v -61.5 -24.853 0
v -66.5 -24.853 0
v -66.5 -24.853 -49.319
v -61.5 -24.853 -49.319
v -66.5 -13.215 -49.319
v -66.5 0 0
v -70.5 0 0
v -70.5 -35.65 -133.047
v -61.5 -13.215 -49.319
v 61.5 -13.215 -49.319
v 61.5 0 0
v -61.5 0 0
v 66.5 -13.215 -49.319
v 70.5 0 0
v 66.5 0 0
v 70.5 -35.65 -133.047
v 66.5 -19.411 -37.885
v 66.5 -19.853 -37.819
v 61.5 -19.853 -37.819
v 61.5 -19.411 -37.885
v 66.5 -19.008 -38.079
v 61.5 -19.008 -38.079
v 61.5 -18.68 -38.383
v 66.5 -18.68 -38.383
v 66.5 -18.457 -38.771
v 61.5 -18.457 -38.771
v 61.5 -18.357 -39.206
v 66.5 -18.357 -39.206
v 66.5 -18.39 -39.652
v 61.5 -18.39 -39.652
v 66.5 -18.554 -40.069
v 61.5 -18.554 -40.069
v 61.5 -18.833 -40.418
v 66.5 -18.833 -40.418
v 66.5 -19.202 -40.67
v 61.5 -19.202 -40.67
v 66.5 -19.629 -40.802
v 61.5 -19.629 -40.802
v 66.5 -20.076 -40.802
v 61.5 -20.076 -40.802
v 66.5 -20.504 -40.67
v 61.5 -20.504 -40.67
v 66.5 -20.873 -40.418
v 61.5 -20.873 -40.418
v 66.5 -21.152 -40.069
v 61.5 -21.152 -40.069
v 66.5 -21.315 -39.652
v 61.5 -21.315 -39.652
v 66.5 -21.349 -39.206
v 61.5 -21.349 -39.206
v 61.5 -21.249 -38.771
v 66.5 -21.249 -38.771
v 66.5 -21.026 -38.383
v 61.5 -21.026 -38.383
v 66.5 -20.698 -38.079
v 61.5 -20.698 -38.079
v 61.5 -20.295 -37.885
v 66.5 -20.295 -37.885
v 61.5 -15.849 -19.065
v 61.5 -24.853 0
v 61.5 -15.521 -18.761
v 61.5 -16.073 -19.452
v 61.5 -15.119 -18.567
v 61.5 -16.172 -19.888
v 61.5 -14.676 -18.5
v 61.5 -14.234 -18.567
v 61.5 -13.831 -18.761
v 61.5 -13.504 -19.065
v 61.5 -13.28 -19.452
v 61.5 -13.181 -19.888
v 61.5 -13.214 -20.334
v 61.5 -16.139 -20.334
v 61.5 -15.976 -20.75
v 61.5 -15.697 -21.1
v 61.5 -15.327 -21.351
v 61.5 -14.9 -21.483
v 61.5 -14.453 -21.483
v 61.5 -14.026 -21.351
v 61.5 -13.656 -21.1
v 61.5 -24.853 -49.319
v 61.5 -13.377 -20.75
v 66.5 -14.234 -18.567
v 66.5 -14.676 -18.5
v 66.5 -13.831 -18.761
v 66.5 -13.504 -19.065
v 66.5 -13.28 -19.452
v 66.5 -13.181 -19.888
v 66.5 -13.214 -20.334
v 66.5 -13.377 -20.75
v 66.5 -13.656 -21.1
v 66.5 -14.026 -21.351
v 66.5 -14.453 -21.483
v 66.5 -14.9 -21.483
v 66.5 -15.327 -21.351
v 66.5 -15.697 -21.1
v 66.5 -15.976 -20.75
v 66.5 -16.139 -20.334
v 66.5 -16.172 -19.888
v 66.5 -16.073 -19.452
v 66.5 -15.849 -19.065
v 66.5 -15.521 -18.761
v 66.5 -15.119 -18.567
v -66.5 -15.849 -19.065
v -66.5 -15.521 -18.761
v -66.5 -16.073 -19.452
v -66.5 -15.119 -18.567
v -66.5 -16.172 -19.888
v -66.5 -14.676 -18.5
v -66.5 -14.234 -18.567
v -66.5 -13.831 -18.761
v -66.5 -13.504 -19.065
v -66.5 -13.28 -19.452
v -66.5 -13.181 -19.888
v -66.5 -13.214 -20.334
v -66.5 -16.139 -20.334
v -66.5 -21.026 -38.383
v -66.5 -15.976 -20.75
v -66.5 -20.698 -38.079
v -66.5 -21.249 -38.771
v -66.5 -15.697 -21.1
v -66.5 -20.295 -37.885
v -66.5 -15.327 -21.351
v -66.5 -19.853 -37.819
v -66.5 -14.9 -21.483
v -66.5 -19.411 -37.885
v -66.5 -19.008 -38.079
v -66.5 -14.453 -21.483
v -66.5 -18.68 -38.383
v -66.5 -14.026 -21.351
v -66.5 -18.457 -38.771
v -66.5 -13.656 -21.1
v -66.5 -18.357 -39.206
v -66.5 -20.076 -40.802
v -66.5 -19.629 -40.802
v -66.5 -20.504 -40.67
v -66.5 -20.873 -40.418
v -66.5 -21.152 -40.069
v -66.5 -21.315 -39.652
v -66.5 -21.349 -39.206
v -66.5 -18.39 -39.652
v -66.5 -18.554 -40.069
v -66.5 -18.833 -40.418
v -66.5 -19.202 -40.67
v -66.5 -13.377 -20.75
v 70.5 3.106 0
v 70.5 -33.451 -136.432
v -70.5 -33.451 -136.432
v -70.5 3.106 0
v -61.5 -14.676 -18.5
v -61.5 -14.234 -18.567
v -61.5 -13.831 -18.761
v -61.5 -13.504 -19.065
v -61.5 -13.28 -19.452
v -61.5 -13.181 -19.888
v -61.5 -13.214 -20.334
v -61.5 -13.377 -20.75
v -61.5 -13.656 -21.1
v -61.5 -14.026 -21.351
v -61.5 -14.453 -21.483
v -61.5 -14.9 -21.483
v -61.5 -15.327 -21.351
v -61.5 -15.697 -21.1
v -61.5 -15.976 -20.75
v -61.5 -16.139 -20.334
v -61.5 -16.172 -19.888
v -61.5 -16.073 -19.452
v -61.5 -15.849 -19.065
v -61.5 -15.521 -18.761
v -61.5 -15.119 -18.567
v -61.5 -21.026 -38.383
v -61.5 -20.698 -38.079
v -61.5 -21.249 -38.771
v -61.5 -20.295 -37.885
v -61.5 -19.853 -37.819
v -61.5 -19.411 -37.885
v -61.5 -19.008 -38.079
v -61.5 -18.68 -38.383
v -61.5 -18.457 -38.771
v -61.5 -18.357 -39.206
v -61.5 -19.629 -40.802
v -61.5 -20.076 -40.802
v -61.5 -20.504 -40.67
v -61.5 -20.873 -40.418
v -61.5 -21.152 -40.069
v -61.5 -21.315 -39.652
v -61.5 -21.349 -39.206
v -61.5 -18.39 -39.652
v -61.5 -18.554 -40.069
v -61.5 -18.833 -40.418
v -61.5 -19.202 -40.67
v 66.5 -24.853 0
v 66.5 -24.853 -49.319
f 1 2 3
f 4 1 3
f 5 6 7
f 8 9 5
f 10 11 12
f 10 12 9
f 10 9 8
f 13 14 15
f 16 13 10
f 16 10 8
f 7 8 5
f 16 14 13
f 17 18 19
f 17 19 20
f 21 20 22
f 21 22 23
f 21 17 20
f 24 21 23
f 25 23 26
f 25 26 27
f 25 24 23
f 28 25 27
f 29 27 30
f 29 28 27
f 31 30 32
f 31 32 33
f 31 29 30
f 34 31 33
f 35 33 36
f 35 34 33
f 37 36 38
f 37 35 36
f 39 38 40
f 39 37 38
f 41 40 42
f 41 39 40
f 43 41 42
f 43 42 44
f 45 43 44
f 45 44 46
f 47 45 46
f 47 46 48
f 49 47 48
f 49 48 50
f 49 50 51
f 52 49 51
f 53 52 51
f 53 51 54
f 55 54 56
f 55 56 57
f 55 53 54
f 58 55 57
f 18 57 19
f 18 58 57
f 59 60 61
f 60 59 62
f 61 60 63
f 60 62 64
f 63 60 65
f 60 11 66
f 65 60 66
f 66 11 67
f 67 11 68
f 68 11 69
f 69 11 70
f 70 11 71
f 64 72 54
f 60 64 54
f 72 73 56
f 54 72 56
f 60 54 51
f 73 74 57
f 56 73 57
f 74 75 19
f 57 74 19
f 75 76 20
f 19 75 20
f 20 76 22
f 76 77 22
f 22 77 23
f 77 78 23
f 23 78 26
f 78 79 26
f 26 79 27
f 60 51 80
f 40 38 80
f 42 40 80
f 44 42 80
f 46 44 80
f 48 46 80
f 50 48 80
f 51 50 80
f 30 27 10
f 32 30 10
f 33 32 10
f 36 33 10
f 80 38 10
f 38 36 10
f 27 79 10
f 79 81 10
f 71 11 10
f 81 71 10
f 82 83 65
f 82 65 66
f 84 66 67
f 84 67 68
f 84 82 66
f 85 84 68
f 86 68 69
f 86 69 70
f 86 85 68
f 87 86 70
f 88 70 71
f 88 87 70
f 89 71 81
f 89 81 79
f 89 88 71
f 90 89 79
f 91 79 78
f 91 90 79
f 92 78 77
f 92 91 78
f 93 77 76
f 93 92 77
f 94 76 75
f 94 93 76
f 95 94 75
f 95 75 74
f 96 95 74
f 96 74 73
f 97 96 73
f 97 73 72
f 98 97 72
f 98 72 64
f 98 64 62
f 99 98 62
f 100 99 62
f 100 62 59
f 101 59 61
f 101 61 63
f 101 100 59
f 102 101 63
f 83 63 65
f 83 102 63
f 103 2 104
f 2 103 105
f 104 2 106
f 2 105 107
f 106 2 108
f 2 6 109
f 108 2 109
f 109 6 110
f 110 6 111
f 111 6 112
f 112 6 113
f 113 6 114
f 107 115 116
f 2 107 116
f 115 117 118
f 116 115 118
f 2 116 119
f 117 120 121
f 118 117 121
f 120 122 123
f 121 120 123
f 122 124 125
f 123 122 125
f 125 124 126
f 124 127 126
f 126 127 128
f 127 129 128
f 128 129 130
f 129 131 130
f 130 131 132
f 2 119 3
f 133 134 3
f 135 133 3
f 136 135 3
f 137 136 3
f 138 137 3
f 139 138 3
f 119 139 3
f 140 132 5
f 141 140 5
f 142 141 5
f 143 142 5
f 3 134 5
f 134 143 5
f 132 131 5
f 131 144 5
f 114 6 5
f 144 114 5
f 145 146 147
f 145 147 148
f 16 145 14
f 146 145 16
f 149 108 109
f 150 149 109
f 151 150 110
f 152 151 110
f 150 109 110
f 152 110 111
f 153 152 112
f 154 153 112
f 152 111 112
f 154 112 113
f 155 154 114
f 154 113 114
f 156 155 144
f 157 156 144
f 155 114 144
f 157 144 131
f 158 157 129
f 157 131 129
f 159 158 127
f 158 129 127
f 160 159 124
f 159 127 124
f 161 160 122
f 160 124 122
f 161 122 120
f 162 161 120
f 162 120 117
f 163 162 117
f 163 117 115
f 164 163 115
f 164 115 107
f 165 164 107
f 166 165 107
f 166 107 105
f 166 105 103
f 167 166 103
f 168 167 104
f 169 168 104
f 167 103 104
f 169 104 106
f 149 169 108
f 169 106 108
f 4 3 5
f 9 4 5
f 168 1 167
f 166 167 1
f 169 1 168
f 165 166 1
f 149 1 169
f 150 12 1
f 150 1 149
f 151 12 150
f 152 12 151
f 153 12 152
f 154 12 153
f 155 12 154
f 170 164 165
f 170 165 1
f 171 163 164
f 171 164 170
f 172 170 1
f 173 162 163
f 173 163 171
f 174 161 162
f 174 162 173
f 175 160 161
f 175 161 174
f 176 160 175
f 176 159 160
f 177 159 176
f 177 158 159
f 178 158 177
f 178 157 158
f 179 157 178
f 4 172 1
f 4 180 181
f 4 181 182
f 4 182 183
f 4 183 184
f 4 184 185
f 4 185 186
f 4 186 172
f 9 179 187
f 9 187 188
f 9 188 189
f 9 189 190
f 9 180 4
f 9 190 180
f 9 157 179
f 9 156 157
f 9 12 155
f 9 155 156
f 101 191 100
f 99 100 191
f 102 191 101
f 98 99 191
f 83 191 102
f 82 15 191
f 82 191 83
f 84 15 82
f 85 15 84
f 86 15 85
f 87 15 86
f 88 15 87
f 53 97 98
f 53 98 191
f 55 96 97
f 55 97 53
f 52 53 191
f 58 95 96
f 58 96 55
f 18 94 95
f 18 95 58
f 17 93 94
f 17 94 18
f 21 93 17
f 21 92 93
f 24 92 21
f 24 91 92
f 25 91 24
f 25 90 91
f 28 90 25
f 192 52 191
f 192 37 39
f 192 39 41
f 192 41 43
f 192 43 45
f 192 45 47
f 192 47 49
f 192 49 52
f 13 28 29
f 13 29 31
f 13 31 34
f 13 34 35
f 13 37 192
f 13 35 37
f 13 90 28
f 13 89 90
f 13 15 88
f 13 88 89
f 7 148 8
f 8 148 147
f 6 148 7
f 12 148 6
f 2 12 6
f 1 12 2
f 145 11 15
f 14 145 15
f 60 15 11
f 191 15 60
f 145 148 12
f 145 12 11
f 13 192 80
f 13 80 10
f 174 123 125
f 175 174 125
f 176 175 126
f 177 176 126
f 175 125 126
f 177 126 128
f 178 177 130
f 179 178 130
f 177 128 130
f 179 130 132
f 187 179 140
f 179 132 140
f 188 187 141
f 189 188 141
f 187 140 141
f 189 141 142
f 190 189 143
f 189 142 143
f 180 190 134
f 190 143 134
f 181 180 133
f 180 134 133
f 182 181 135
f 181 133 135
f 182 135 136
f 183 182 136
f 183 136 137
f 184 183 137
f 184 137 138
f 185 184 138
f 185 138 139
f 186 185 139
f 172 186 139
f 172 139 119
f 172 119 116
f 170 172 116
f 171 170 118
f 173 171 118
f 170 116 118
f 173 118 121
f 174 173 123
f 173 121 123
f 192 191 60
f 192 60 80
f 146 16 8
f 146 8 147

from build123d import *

# Parameters (mm, degrees)
BOSS_EXTRUDE1_DEPTH = 70.5
SKETCH2_R           = 1.5
BOSS_EXTRUDE2_DEPTH = 5


with BuildPart() as part:
    # Sketch1 → Boss-Extrude1 (new, symmetric)
    with BuildSketch(Plane(origin=(0, 0, 0), x_dir=(0, 0, -1), z_dir=(1, 0, 0))):
        Polygon((0, 0), (133.046623313, -35.649735272), (136.43225101, -33.451082938), (0, 3.105828541), align=None)
    extrude(amount=BOSS_EXTRUDE1_DEPTH, both=True)

    # Sketch2 → Boss-Extrude2 (add)
    with BuildSketch(Plane.ZY.offset(66.5)):
        Polygon((0, 0), (0, -24.852850374), (-49.318516526, -24.852850374), (-49.318516526, -13.214856675), align=None)
        with Locations((-20, -14.676469472)):
            Circle(SKETCH2_R, mode=Mode.SUBTRACT)
        with Locations((-39.318516526, -19.852850374)):
            Circle(SKETCH2_R, mode=Mode.SUBTRACT)
    boss_extrude2 = extrude(amount=-BOSS_EXTRUDE2_DEPTH)

    # Mirror1: Boss-Extrude2 across plane
    add(boss_extrude2.mirror(Plane(origin=(0, 0, 0), x_dir=(0, 0, 1), z_dir=(1, 0, 0))))


solid = part.part
